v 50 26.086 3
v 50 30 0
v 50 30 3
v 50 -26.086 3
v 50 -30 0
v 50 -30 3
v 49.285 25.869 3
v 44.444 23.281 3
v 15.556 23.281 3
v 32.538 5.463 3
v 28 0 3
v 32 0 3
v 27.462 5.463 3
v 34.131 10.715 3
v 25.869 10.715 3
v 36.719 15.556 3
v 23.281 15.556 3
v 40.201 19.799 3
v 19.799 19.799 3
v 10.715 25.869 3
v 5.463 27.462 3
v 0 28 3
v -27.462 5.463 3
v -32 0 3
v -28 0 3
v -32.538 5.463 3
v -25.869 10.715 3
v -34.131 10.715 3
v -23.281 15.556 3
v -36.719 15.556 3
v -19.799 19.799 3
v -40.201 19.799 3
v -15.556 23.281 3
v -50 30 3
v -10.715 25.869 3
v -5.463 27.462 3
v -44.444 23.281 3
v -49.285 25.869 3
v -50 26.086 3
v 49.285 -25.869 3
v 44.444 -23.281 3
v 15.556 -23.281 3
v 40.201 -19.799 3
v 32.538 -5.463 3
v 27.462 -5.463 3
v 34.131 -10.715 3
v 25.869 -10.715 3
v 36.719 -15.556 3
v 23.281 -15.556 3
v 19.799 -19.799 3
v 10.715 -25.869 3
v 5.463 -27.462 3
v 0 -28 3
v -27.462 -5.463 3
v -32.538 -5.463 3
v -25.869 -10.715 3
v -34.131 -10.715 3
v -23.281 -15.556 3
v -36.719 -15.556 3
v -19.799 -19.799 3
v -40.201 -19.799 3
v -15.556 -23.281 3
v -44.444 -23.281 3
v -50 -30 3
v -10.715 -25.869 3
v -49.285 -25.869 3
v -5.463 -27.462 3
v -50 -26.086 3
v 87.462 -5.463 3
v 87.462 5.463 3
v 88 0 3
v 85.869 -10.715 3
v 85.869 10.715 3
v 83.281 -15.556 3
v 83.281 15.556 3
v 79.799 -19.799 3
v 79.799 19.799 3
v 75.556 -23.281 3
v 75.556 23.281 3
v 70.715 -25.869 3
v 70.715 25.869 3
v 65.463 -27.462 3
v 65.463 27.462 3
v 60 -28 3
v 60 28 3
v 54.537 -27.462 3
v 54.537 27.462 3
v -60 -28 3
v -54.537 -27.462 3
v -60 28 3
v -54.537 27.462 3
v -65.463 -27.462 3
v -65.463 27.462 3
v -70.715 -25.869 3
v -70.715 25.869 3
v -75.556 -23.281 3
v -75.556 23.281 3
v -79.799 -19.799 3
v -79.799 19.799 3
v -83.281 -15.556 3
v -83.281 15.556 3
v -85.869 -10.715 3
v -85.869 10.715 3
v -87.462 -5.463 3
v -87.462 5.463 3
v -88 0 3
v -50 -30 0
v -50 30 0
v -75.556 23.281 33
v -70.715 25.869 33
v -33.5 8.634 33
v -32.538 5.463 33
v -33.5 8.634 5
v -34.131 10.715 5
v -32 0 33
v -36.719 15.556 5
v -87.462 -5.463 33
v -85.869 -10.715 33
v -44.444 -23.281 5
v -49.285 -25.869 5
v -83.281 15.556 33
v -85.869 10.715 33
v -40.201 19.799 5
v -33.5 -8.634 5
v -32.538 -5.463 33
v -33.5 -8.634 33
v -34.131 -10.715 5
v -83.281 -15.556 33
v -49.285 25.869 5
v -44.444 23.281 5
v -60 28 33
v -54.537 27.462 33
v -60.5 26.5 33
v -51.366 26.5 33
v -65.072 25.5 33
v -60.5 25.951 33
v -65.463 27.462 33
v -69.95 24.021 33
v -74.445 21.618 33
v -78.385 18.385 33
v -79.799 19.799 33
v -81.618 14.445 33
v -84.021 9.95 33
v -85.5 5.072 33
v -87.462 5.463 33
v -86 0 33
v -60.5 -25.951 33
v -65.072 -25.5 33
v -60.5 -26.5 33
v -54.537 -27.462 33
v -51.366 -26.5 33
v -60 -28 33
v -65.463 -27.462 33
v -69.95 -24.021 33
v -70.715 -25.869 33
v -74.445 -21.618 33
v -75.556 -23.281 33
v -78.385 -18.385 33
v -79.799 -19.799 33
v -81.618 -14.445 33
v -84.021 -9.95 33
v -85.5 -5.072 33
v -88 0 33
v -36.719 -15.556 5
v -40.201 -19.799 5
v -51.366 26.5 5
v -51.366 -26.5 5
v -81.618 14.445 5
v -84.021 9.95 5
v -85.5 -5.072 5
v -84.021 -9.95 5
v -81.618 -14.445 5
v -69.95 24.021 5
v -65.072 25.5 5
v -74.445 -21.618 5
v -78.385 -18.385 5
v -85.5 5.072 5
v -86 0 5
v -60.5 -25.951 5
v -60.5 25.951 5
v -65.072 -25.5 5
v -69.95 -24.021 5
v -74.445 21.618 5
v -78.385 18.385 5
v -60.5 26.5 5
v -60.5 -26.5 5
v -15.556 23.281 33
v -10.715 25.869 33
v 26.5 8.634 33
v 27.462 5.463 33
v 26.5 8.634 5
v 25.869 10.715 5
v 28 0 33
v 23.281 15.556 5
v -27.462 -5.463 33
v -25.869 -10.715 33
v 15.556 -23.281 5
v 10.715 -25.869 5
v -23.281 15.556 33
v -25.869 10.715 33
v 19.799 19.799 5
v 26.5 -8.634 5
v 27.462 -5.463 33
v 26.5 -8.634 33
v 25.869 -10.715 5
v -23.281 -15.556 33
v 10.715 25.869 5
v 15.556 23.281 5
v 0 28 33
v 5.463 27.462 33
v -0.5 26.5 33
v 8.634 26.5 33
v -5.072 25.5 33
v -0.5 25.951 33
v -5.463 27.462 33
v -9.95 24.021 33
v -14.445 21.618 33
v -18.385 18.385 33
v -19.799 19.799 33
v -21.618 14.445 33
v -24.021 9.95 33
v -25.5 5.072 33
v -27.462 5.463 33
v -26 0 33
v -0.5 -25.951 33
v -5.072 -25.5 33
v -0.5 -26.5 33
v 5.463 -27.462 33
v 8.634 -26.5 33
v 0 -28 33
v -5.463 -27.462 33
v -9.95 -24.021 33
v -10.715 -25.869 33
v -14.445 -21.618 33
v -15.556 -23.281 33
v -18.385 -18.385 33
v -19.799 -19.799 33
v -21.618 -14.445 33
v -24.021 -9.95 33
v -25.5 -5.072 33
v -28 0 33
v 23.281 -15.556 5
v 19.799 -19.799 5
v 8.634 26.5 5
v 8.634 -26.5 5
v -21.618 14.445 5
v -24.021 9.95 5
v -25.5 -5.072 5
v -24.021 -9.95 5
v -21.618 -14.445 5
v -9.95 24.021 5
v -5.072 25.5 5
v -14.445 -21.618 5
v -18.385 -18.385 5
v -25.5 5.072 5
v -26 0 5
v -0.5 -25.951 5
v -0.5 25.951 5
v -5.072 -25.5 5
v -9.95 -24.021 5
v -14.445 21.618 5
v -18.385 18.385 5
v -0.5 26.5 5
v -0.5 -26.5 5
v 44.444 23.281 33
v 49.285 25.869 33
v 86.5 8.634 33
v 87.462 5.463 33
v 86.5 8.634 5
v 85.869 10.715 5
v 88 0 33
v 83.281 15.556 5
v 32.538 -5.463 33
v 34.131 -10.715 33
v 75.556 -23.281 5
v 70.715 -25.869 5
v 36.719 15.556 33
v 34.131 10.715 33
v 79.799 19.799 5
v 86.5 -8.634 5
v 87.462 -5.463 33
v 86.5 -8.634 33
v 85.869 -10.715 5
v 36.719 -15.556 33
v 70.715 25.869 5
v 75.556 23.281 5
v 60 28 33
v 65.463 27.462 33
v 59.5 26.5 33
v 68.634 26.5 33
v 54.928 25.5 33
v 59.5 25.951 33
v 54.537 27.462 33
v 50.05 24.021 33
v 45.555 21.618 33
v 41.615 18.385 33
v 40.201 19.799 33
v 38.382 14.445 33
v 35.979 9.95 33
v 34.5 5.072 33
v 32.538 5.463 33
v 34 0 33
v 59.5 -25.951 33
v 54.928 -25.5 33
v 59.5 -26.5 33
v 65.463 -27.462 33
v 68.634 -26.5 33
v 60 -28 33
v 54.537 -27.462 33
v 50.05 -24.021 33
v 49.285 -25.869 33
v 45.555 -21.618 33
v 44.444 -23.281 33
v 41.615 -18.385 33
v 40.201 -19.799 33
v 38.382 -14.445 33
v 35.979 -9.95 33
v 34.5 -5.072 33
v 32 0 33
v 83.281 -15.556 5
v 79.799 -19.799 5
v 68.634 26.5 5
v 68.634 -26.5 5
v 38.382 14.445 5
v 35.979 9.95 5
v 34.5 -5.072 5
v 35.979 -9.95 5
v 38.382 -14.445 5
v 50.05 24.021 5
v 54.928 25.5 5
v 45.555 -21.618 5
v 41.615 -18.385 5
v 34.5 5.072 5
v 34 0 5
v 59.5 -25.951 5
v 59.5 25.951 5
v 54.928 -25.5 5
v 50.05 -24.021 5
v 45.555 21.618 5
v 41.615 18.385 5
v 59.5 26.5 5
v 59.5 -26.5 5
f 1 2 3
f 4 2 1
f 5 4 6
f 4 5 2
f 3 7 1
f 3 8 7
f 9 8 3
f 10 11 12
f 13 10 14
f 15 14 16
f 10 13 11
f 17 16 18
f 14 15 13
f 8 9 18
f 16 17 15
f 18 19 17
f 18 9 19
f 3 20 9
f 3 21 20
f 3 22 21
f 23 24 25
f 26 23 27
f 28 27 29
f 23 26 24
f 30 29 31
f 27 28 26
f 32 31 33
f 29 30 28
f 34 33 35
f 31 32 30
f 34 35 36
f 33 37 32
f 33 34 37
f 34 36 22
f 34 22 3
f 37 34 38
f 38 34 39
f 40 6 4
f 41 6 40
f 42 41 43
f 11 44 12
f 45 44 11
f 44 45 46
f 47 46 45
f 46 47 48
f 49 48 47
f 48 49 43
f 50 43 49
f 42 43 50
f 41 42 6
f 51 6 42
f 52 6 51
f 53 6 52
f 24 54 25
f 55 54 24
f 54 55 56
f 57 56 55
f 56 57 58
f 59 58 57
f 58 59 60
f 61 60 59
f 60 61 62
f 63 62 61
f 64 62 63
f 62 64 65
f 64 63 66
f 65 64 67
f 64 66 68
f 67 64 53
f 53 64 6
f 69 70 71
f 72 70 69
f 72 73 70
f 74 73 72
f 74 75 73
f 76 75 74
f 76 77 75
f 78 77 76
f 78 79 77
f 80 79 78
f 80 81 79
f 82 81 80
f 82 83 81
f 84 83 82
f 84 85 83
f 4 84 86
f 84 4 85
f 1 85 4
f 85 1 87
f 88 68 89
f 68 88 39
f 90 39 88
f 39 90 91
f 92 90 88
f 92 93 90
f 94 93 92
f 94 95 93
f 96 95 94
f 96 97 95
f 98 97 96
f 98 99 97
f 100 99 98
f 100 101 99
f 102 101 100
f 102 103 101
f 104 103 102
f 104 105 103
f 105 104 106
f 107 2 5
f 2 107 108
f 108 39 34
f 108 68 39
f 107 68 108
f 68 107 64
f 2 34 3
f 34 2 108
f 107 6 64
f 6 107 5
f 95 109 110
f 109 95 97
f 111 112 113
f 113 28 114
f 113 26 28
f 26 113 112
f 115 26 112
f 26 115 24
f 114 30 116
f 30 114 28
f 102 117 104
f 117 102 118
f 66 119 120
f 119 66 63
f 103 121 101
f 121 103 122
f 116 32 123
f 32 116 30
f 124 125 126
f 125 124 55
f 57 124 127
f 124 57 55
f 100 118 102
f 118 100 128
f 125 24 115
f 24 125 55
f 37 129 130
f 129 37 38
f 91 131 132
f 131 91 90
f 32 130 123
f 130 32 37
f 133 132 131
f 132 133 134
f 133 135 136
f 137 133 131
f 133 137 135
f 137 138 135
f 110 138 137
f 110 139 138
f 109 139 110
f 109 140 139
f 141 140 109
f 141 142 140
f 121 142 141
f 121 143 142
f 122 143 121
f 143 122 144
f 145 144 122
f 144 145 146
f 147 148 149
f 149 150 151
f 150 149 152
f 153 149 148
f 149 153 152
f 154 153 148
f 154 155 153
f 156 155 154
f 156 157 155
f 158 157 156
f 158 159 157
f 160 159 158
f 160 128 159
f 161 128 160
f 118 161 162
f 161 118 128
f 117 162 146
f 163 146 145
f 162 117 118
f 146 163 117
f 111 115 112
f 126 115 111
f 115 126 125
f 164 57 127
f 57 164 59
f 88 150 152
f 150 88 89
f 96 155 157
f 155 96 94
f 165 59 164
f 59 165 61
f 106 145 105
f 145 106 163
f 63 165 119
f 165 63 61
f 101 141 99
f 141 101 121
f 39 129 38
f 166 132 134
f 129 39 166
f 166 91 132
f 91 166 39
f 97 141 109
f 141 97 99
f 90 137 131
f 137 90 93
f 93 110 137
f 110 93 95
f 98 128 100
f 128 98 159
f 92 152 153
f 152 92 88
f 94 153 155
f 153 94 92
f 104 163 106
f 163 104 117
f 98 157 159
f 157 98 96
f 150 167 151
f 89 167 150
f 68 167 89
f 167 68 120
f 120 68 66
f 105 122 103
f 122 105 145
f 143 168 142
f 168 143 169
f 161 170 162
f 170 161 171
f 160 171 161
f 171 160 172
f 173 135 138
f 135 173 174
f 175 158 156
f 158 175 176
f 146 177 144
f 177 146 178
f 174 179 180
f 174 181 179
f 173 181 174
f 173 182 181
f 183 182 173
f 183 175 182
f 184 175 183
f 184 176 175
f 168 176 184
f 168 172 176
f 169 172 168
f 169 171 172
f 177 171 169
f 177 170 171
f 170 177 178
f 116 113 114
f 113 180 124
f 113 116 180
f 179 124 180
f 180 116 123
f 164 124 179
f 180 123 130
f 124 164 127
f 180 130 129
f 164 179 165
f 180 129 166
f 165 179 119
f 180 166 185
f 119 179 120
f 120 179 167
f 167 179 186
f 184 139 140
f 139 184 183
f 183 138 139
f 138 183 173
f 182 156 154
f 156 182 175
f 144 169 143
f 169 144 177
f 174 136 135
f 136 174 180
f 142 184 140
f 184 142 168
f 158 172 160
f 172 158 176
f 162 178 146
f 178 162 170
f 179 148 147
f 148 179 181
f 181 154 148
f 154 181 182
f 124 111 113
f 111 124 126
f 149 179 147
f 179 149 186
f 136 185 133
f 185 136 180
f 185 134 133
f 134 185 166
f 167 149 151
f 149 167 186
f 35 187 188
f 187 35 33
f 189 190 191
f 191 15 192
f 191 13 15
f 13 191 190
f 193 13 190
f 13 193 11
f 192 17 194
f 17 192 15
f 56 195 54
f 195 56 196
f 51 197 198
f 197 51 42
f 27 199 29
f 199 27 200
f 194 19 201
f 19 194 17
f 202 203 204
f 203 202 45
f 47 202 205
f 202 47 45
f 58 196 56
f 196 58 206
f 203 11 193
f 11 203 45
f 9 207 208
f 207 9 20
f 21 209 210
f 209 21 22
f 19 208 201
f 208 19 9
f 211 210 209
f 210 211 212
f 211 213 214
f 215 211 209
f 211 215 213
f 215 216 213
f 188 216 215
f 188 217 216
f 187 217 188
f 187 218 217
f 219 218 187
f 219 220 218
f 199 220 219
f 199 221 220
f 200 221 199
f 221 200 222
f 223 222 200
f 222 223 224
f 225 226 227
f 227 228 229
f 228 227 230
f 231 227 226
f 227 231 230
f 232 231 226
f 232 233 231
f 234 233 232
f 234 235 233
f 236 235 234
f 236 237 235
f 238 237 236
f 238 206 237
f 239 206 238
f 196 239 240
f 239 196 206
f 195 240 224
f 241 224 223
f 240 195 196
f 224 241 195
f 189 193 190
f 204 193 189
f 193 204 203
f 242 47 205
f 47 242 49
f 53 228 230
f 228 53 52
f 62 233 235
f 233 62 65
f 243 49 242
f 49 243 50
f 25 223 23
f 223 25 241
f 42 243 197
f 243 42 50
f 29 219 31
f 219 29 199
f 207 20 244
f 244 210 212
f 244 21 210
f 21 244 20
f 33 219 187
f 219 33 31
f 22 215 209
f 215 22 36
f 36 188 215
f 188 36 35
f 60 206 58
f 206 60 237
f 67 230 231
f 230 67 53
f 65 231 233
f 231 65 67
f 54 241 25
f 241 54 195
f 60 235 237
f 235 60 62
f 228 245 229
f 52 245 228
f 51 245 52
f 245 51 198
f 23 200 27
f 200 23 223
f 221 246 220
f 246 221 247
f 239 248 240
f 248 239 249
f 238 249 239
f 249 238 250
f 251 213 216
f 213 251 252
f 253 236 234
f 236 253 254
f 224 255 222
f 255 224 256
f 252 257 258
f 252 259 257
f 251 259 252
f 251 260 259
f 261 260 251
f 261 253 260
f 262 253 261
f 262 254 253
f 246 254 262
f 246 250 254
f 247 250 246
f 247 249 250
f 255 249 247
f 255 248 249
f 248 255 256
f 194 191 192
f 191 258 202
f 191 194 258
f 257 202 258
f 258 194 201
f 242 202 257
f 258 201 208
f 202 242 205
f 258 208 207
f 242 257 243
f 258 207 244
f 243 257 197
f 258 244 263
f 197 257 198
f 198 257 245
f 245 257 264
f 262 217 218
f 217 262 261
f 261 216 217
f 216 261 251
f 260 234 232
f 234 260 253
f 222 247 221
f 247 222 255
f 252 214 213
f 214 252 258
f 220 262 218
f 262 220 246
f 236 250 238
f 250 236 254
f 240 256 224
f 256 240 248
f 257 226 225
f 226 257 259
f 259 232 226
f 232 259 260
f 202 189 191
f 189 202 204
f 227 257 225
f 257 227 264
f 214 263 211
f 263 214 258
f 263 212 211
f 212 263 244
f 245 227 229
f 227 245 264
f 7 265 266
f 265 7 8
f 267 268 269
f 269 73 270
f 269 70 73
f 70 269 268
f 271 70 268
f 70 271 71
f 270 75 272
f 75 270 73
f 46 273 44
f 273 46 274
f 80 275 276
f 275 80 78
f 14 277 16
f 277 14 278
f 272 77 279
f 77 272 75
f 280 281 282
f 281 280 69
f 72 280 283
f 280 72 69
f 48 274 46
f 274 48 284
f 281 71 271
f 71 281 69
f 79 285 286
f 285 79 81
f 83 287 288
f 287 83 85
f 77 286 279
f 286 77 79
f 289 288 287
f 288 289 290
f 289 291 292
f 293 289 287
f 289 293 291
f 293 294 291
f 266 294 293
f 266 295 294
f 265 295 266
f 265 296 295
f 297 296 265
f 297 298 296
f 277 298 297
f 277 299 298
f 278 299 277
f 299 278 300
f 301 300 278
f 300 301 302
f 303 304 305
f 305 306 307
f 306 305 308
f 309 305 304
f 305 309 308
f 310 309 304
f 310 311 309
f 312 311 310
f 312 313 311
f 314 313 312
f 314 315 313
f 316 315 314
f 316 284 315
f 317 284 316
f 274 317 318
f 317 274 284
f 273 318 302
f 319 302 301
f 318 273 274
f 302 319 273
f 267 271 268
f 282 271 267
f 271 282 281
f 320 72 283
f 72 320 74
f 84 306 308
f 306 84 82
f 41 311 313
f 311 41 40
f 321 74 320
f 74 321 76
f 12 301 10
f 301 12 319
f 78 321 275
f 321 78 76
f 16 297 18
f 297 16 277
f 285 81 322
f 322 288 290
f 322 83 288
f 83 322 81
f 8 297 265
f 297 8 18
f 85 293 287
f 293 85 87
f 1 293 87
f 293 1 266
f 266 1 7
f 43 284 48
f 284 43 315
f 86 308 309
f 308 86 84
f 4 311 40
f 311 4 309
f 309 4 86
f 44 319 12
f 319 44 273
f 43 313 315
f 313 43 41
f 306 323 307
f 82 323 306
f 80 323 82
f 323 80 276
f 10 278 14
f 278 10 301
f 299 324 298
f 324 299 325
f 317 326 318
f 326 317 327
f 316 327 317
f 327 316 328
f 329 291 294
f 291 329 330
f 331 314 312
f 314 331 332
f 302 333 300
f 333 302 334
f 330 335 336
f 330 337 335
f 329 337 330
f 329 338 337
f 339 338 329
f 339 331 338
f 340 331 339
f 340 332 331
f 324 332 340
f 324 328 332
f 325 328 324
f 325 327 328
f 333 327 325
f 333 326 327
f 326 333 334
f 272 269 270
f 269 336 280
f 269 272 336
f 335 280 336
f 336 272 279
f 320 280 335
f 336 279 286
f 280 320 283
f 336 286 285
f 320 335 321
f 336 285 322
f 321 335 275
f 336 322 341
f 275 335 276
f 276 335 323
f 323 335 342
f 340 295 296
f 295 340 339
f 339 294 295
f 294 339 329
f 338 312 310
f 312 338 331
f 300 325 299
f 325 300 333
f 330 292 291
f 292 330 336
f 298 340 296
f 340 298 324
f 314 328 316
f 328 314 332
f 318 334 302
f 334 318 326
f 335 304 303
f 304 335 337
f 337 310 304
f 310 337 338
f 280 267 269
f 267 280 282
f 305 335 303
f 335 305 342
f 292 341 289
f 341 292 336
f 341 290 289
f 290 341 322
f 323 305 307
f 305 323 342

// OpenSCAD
// file: ../models/part_two.scad
// ============================================================
// PART: Part Two
// Description: Holder/mount component for [PROJECT_NAME]
// ============================================================

include <../config.scad>
include <consts.scad>

// ============================================================
// PART MODULE
// ============================================================

// Module: part_two()
// Usage:
//   part_two();
//   part_two(height, wall);
// Description:
//   Creates a holder/mount component with a slot
// Arguments:
//   height = Overall height of the holder. Default: BASE_HEIGHT
//   wall = Wall thickness. Default: WALL_THICKNESS
// Example(3D): Standard holder
//   part_two();
// Example(3D): Taller holder with thicker walls
//   part_two(height=50, wall=3);
module part_two(
    height = BASE_HEIGHT,
    wall = WALL_THICKNESS
) {
    difference() {
        // Main body - cylinder or rounded rectangle
        translate([0, 0, height/2])
            cylinder(
                d = SLOT_WIDTH + wall * 2,
                h = height,
                center = true
            );

        // Slot for widget
        translate([0, 0, wall])
            cylinder(
                d = SLOT_WIDTH,
                h = height,
                center = false
            );

        // Side opening for insertion
        translate([SLOT_WIDTH/4, 0, height/2 + wall])
            cube([
                SLOT_WIDTH/2 + 1,
                SLOT_WIDTH + 1,
                height
            ], center = true);
    }
}

// ============================================================
// RENDER
// ============================================================

// Render this part when file is opened directly
part_two();
// file: ../models/part_one.scad
// ============================================================
// PART: Part One
// Description: Base plate for [PROJECT_NAME]
// ============================================================

include <../config.scad>
include <consts.scad>

// ============================================================
// PART MODULE
// ============================================================

// Module: part_one()
// Usage:
//   part_one();
//   part_one(width, depth, thickness);
// Description:
//   Creates the base plate with mounting holes
// Arguments:
//   width = Width of the base plate. Default: BASE_WIDTH
//   depth = Depth of the base plate. Default: BASE_DEPTH
//   thickness = Thickness of the plate. Default: FLOOR_THICKNESS
// Example(3D): Standard base plate
//   part_one();
// Example(3D): Custom sized base plate
//   part_one(width=150, depth=80, thickness=5);
module part_one(
    width = BASE_WIDTH,
    depth = BASE_DEPTH,
    thickness = FLOOR_THICKNESS
) {
    difference() {
        // Main plate body
        translate([0, 0, thickness/2])
            cube([width, depth, thickness], center = true);

        // Mounting holes at corners
        for (x = [-1, 1], y = [-1, 1]) {
            translate([
                x * MOUNTING_HOLE_SPACING/2,
                y * MOUNTING_HOLE_SPACING/2,
                -0.1
            ])
                cylinder(
                    d = MOUNTING_HOLE_DIAMETER,
                    h = thickness + 0.2,
                    $fn = EXPORT_MODE ? 64 : 16
                );
        }
    }
}

// ============================================================
// RENDER
// ============================================================

// Render this part when file is opened directly
part_one();
// file: ../models/consts.scad
// ============================================================
// SHARED CONSTANTS
// Description: Constants used by multiple parts in [PROJECT_NAME]
// ============================================================

// ============================================================
// WIDGET DIMENSIONS
// ============================================================
// Example: If your project holds/fits a specific object,
// define its dimensions here

// Widget dimensions (example - replace with your actual object)
WIDGET_DIAMETER = 50;
WIDGET_HEIGHT = 20;

// ============================================================
// CALCULATED DIMENSIONS
// ============================================================
// Dimensions derived from base constants and tolerances

// Slot/holder sizing with clearance
SLOT_WIDTH = WIDGET_DIAMETER + 2;      // 2mm total clearance
SLOT_HEIGHT = WIDGET_HEIGHT + 1;       // 1mm clearance

// Spacing between elements
ELEMENT_SPACING = WIDGET_DIAMETER + 10;  // 10mm gap between widgets

// ============================================================
// EXAMPLE USAGE
// ============================================================
// In your part files:
//   include <consts.scad>
//   cylinder(d = WIDGET_DIAMETER + TOLERANCE, h = WIDGET_HEIGHT);
// file: ../config.scad
// ============================================================
// PROJECT CONFIGURATION
// Description: Global settings for [PROJECT_NAME]
// ============================================================

// ============================================================
// RENDERING SETTINGS
// ============================================================

// Preview quality (lower = faster preview)
PREVIEW_FN = 32;

// Export quality (higher = smoother STL)
EXPORT_FN = 128;

// Current mode (set to true when exporting STL)
// Override from command line: openscad -D 'EXPORT_MODE=true' ...
EXPORT_MODE = false;

// Convenience variable - automatically use correct quality
$fn = EXPORT_MODE ? EXPORT_FN : PREVIEW_FN;

// ============================================================
// PROJECT DIMENSIONS
// ============================================================

// Base dimensions (millimeters)
BASE_WIDTH = 100;
BASE_DEPTH = 60;
BASE_HEIGHT = 30;

// Material settings
WALL_THICKNESS = 2;
FLOOR_THICKNESS = 3;

// Hardware
MOUNTING_HOLE_DIAMETER = 5;
MOUNTING_HOLE_SPACING = 80;

// ============================================================
// TOLERANCES
// ============================================================

// General fit tolerance (for sliding parts)
TOLERANCE = 0.2;

// Tight fit (press-fit, requires force)
TIGHT_FIT = 0.1;

// Loose fit (easy sliding, clearance)
LOOSE_FIT = 0.5;

// 3D printer compensation (add to holes, subtract from pegs)
PRINTER_TOLERANCE = 0.15;

// ============================================================
// FEATURE FLAGS
// ============================================================

// Enable experimental features
ENABLE_ADVANCED_FEATURES = false;

// Include support structures in export
INCLUDE_SUPPORTS = false;

// Show reference geometry in previews
SHOW_REFERENCE = true;

// ============================================================
// RENDERING HELPERS
// ============================================================

// Helper function to determine if we're in preview mode
function is_preview() = !EXPORT_MODE;

// Helper function to determine if we're in export mode
function is_export() = EXPORT_MODE;
// main file
// ============================================================
// PREVIEW: Full Assembly
// Description: Complete assembly showing all parts
// ============================================================
// This file is optimized for fast preview (F5)
// Use this for design iteration and fit checking

include <../config.scad>
include <../models/consts.scad>

use <../models/part_one.scad>
use <../models/part_two.scad>

// Override for faster preview
$fn = 16;

// ============================================================
// ASSEMBLY PREVIEW
// ============================================================

// Base plate
color("lightblue")
    part_one();

// Holders on base
color("gray") {
    for (i = [0 : 2]) {
        translate([
            (i - 1) * ELEMENT_SPACING,
            0,
            FLOOR_THICKNESS
        ])
            part_two();
    }
}

// ============================================================
// REFERENCE GEOMETRY
// ============================================================

// Show widget for size reference (semi-transparent)
if (SHOW_REFERENCE) {
    for (i = [0 : 2]) {
        translate([
            (i - 1) * ELEMENT_SPACING,
            0,
            FLOOR_THICKNESS + WALL_THICKNESS + SLOT_HEIGHT/2
        ])
        %color("black", alpha=0.3)
            cylinder(
                d = WIDGET_DIAMETER,
                h = WIDGET_HEIGHT,
                center = true,
                $fn = 16
            );
    }
}

// Optional: Show build volume for reference
// %color("red", alpha=0.1)
//     translate([0, 0, 100])
//         cube([200, 200, 200], center=true);
